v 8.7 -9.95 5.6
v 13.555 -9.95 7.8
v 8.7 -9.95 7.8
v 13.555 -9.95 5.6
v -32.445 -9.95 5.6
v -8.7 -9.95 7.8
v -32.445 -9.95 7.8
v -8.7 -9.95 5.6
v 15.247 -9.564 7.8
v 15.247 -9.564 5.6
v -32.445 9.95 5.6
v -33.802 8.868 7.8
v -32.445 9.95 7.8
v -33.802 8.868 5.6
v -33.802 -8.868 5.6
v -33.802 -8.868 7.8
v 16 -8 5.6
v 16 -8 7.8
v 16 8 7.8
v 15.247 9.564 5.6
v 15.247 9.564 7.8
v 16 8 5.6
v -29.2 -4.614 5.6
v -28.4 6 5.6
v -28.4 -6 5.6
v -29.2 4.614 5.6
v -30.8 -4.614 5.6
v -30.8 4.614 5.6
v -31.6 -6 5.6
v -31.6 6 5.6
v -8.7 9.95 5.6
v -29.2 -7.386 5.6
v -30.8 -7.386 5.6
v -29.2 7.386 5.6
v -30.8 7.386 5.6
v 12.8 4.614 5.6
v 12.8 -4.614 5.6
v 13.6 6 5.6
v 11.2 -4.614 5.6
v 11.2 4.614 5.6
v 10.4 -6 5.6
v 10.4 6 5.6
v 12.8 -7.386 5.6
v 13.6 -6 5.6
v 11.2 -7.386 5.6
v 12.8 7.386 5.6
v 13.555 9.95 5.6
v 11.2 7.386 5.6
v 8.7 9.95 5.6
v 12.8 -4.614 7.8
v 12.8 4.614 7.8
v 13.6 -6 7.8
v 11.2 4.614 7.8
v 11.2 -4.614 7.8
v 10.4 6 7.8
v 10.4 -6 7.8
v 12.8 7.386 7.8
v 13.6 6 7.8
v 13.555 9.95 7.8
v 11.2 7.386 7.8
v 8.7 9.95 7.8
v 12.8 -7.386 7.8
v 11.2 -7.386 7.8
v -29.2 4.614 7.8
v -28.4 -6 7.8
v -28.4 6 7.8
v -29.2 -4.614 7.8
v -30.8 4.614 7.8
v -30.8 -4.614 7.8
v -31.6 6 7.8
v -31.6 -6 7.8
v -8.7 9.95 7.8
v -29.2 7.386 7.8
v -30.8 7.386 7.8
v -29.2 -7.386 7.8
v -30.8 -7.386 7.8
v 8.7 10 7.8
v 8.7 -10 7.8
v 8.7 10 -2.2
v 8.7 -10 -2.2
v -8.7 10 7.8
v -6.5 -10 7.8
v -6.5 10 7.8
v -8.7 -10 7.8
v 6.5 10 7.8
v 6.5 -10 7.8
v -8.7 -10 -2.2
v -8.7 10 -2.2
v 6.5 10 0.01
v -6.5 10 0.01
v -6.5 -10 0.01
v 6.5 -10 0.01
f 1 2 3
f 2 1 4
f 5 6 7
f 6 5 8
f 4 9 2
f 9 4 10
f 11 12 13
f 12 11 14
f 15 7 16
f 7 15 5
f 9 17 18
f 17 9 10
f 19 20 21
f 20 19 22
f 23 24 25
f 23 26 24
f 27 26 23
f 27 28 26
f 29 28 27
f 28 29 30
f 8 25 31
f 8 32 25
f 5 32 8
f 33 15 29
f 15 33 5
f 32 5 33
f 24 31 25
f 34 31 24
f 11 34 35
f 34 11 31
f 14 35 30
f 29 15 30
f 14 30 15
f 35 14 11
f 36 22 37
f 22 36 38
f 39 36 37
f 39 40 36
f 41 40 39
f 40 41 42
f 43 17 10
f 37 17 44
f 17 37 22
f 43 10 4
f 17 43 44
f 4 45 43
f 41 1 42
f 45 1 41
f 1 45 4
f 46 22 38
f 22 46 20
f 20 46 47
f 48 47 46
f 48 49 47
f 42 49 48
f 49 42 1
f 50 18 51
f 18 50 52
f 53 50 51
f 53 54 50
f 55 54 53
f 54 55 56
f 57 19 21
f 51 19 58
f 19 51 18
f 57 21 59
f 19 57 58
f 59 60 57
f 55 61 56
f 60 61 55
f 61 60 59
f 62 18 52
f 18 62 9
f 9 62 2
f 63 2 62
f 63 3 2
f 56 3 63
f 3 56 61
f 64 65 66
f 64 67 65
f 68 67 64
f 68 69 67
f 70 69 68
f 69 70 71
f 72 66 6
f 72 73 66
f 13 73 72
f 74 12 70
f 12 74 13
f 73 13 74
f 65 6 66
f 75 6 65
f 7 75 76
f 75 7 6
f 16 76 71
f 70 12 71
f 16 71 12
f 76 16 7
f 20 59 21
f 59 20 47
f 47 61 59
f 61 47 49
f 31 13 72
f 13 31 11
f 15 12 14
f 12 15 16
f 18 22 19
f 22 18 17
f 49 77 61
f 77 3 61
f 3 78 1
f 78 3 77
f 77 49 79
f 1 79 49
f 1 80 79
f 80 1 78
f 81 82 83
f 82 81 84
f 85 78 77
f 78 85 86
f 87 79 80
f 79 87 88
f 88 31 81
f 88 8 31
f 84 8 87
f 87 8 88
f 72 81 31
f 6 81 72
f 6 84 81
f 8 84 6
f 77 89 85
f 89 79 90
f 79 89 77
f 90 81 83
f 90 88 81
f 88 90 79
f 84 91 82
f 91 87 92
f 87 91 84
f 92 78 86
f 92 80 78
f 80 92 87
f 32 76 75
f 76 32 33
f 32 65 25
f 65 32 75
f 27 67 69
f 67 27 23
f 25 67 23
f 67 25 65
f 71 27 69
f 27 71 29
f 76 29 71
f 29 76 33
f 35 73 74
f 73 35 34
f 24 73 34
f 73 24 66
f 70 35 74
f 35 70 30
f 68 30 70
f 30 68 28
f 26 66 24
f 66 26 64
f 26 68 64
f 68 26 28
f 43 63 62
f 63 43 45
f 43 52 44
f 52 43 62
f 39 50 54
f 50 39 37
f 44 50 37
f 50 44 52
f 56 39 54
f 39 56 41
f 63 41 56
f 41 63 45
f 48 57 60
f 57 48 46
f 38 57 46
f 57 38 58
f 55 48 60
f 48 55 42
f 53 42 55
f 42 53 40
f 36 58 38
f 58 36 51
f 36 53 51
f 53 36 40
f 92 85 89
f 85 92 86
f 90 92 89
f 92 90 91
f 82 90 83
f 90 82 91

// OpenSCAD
// file: ../util/screws.scad
module screws(count=4, radius=5, size=3.3, thickness=2.2)
{
	for (screw=[1:count]) {
		rotate([0,0,screw*360/count])
		translate([radius,0,-1])
		cylinder(d=size, h=thickness+2);
	}
}

module squareScrews(w=10, h=10, size=3.3, thickness=2.2) {
	for (X=[-w/2, w/2])
	for (Y=[-h/2, h/2])
	translate([X,Y,-1])		
		cylinder(d=size, h=thickness+2);
}
// file: ../util/rounded.scad
// Do a rounded cube
module rounded(x=10, y=10, z=10, r=3, center=false) {
  if (center) {
    translate([-(x/2),-(y/2),0])
      rounded(x, y, z, r);
  } else {
    translate([r,r,0])
    minkowski() {
      cube([x-2*r,y-2*r,z/2]);
      cylinder(h=z/2, r=r);
    }
  }
}
// file: ../models/ollo.scad
// Diameter of plastic ollo holes
OlloHoles = 4.3;

// Width of Ollo "real" plastic
OlloWidth = 3;

// Distance between two ollo holes
OlloSpacing = 6;

// Do an Ollo hole on the part
module olloHole(depth=2.2)
{
    translate([0,0,-0.1])
      cylinder(depth+0.2, OlloHoles/2, OlloHoles/2);
}

// Do 3 ollo holes
module threeOllo(depth=2.2)
{
  for (xy=[[-OlloSpacing,0],[0,0],[OlloSpacing,0]]) {
    translate([xy[0], xy[1], 0])
    olloHole(depth);
  }
}

// Do a servo arm holes
module servoArm(depth=2.2)
{
    threeOllo(depth);
    rotate([0,0,90])
      threeOllo(depth);
}
// main file
include <../models/ollo.scad>;
use <../util/rounded.scad>;
use <../util/screws.scad>;

module batfix(thickness=2.2, cavity=13, height=10, screws=3.2,print=false)
{
	shift=9;
	holesSpacingW = OlloSpacing*7;
	holesSpacingH = OlloSpacing*2;
	R=print?[90,0,0]:[0,0,0];
	translate([-shift,0,height-2*thickness])
	rotate(R)
	difference() {
		union() {
			rounded(50, 20, thickness, 2, center=true);
			translate([shift,0,thickness-height/2])
			cube([cavity+2*thickness,20,height], center=true);
		}
		
		for (X=[-holesSpacingW/2, holesSpacingW/2])
		for (Y=[-holesSpacingH/2, holesSpacingH/2])
		translate([X,Y,-1])			
			cylinder(d=screws, h=thickness+2);
		
		translate([shift,0,0.01+2*thickness-height/2])
			cube([cavity,22,height], center=true);
		
		translate([shift,0,thickness-height])
			children();
	}
}

batfix();
